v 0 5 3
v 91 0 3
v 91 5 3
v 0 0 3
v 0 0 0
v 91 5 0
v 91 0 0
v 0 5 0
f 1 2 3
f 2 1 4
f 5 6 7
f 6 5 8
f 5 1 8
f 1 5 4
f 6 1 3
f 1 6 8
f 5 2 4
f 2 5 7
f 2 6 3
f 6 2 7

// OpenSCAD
translate([1.0, 2.5, 1.5]) color([0.4341718354537837, 0.6108869734438016, 0.9130110532378982]) cube([2, 5, 3], center=true);
translate([3.0, 2.5, 1.5]) color([0.9666063677707588, 0.47700977655271704, 0.8653099277716401]) cube([2, 5, 3], center=true);
translate([5.0, 2.5, 1.5]) color([0.2604923103919594, 0.8050278270130223, 0.5486993038355893]) cube([2, 5, 3], center=true);
translate([7.0, 2.5, 1.5]) color([0.014041700164018955, 0.7197046864039541, 0.39882354222426875]) cube([2, 5, 3], center=true);
translate([9.0, 2.5, 1.5]) color([0.824844977148233, 0.6681532012318508, 0.0011428193144282783]) cube([2, 5, 3], center=true);
translate([11.0, 2.5, 1.5]) color([0.49357786646532464, 0.8676027754927809, 0.24391087688713198]) cube([2, 5, 3], center=true);
translate([13.0, 2.5, 1.5]) color([0.32520436274739006, 0.8704712321086546, 0.19106709150239054]) cube([2, 5, 3], center=true);
translate([17.5, 2.5, 1.5]) color([0.5675107406206719, 0.23861592861522019, 0.9675402502901433]) cube([7, 5, 3], center=true);
translate([24.5, 2.5, 1.5]) color([0.80317946927987, 0.44796957143557037, 0.08044581855253541]) cube([7, 5, 3], center=true);
translate([31.5, 2.5, 1.5]) color([0.32005460467254576, 0.5079406425205739, 0.9328338242269067]) cube([7, 5, 3], center=true);
translate([38.5, 2.5, 1.5]) color([0.10905784593110368, 0.5512672460905512, 0.7065614098668896]) cube([7, 5, 3], center=true);
translate([45.5, 2.5, 1.5]) color([0.5474409113284238, 0.814466863291336, 0.540283606970324]) cube([7, 5, 3], center=true);
translate([52.5, 2.5, 1.5]) color([0.9638385459738009, 0.603185627961383, 0.5876170641754364]) cube([7, 5, 3], center=true);
translate([59.5, 2.5, 1.5]) color([0.4449890262755162, 0.5962868615831063, 0.38490114597266045]) cube([7, 5, 3], center=true);
translate([66.5, 2.5, 1.5]) color([0.5756510141648885, 0.290329502402758, 0.18939132855435614]) cube([7, 5, 3], center=true);
translate([73.5, 2.5, 1.5]) color([0.1867295282555551, 0.6127731798686067, 0.6566593889896288]) cube([7, 5, 3], center=true);
translate([80.5, 2.5, 1.5]) color([0.47653099200938076, 0.08982436119559367, 0.7576039219664368]) cube([7, 5, 3], center=true);
translate([87.5, 2.5, 1.5]) color([0.8767703708227748, 0.9233810159462806, 0.8424602231401824]) cube([7, 5, 3], center=true);
